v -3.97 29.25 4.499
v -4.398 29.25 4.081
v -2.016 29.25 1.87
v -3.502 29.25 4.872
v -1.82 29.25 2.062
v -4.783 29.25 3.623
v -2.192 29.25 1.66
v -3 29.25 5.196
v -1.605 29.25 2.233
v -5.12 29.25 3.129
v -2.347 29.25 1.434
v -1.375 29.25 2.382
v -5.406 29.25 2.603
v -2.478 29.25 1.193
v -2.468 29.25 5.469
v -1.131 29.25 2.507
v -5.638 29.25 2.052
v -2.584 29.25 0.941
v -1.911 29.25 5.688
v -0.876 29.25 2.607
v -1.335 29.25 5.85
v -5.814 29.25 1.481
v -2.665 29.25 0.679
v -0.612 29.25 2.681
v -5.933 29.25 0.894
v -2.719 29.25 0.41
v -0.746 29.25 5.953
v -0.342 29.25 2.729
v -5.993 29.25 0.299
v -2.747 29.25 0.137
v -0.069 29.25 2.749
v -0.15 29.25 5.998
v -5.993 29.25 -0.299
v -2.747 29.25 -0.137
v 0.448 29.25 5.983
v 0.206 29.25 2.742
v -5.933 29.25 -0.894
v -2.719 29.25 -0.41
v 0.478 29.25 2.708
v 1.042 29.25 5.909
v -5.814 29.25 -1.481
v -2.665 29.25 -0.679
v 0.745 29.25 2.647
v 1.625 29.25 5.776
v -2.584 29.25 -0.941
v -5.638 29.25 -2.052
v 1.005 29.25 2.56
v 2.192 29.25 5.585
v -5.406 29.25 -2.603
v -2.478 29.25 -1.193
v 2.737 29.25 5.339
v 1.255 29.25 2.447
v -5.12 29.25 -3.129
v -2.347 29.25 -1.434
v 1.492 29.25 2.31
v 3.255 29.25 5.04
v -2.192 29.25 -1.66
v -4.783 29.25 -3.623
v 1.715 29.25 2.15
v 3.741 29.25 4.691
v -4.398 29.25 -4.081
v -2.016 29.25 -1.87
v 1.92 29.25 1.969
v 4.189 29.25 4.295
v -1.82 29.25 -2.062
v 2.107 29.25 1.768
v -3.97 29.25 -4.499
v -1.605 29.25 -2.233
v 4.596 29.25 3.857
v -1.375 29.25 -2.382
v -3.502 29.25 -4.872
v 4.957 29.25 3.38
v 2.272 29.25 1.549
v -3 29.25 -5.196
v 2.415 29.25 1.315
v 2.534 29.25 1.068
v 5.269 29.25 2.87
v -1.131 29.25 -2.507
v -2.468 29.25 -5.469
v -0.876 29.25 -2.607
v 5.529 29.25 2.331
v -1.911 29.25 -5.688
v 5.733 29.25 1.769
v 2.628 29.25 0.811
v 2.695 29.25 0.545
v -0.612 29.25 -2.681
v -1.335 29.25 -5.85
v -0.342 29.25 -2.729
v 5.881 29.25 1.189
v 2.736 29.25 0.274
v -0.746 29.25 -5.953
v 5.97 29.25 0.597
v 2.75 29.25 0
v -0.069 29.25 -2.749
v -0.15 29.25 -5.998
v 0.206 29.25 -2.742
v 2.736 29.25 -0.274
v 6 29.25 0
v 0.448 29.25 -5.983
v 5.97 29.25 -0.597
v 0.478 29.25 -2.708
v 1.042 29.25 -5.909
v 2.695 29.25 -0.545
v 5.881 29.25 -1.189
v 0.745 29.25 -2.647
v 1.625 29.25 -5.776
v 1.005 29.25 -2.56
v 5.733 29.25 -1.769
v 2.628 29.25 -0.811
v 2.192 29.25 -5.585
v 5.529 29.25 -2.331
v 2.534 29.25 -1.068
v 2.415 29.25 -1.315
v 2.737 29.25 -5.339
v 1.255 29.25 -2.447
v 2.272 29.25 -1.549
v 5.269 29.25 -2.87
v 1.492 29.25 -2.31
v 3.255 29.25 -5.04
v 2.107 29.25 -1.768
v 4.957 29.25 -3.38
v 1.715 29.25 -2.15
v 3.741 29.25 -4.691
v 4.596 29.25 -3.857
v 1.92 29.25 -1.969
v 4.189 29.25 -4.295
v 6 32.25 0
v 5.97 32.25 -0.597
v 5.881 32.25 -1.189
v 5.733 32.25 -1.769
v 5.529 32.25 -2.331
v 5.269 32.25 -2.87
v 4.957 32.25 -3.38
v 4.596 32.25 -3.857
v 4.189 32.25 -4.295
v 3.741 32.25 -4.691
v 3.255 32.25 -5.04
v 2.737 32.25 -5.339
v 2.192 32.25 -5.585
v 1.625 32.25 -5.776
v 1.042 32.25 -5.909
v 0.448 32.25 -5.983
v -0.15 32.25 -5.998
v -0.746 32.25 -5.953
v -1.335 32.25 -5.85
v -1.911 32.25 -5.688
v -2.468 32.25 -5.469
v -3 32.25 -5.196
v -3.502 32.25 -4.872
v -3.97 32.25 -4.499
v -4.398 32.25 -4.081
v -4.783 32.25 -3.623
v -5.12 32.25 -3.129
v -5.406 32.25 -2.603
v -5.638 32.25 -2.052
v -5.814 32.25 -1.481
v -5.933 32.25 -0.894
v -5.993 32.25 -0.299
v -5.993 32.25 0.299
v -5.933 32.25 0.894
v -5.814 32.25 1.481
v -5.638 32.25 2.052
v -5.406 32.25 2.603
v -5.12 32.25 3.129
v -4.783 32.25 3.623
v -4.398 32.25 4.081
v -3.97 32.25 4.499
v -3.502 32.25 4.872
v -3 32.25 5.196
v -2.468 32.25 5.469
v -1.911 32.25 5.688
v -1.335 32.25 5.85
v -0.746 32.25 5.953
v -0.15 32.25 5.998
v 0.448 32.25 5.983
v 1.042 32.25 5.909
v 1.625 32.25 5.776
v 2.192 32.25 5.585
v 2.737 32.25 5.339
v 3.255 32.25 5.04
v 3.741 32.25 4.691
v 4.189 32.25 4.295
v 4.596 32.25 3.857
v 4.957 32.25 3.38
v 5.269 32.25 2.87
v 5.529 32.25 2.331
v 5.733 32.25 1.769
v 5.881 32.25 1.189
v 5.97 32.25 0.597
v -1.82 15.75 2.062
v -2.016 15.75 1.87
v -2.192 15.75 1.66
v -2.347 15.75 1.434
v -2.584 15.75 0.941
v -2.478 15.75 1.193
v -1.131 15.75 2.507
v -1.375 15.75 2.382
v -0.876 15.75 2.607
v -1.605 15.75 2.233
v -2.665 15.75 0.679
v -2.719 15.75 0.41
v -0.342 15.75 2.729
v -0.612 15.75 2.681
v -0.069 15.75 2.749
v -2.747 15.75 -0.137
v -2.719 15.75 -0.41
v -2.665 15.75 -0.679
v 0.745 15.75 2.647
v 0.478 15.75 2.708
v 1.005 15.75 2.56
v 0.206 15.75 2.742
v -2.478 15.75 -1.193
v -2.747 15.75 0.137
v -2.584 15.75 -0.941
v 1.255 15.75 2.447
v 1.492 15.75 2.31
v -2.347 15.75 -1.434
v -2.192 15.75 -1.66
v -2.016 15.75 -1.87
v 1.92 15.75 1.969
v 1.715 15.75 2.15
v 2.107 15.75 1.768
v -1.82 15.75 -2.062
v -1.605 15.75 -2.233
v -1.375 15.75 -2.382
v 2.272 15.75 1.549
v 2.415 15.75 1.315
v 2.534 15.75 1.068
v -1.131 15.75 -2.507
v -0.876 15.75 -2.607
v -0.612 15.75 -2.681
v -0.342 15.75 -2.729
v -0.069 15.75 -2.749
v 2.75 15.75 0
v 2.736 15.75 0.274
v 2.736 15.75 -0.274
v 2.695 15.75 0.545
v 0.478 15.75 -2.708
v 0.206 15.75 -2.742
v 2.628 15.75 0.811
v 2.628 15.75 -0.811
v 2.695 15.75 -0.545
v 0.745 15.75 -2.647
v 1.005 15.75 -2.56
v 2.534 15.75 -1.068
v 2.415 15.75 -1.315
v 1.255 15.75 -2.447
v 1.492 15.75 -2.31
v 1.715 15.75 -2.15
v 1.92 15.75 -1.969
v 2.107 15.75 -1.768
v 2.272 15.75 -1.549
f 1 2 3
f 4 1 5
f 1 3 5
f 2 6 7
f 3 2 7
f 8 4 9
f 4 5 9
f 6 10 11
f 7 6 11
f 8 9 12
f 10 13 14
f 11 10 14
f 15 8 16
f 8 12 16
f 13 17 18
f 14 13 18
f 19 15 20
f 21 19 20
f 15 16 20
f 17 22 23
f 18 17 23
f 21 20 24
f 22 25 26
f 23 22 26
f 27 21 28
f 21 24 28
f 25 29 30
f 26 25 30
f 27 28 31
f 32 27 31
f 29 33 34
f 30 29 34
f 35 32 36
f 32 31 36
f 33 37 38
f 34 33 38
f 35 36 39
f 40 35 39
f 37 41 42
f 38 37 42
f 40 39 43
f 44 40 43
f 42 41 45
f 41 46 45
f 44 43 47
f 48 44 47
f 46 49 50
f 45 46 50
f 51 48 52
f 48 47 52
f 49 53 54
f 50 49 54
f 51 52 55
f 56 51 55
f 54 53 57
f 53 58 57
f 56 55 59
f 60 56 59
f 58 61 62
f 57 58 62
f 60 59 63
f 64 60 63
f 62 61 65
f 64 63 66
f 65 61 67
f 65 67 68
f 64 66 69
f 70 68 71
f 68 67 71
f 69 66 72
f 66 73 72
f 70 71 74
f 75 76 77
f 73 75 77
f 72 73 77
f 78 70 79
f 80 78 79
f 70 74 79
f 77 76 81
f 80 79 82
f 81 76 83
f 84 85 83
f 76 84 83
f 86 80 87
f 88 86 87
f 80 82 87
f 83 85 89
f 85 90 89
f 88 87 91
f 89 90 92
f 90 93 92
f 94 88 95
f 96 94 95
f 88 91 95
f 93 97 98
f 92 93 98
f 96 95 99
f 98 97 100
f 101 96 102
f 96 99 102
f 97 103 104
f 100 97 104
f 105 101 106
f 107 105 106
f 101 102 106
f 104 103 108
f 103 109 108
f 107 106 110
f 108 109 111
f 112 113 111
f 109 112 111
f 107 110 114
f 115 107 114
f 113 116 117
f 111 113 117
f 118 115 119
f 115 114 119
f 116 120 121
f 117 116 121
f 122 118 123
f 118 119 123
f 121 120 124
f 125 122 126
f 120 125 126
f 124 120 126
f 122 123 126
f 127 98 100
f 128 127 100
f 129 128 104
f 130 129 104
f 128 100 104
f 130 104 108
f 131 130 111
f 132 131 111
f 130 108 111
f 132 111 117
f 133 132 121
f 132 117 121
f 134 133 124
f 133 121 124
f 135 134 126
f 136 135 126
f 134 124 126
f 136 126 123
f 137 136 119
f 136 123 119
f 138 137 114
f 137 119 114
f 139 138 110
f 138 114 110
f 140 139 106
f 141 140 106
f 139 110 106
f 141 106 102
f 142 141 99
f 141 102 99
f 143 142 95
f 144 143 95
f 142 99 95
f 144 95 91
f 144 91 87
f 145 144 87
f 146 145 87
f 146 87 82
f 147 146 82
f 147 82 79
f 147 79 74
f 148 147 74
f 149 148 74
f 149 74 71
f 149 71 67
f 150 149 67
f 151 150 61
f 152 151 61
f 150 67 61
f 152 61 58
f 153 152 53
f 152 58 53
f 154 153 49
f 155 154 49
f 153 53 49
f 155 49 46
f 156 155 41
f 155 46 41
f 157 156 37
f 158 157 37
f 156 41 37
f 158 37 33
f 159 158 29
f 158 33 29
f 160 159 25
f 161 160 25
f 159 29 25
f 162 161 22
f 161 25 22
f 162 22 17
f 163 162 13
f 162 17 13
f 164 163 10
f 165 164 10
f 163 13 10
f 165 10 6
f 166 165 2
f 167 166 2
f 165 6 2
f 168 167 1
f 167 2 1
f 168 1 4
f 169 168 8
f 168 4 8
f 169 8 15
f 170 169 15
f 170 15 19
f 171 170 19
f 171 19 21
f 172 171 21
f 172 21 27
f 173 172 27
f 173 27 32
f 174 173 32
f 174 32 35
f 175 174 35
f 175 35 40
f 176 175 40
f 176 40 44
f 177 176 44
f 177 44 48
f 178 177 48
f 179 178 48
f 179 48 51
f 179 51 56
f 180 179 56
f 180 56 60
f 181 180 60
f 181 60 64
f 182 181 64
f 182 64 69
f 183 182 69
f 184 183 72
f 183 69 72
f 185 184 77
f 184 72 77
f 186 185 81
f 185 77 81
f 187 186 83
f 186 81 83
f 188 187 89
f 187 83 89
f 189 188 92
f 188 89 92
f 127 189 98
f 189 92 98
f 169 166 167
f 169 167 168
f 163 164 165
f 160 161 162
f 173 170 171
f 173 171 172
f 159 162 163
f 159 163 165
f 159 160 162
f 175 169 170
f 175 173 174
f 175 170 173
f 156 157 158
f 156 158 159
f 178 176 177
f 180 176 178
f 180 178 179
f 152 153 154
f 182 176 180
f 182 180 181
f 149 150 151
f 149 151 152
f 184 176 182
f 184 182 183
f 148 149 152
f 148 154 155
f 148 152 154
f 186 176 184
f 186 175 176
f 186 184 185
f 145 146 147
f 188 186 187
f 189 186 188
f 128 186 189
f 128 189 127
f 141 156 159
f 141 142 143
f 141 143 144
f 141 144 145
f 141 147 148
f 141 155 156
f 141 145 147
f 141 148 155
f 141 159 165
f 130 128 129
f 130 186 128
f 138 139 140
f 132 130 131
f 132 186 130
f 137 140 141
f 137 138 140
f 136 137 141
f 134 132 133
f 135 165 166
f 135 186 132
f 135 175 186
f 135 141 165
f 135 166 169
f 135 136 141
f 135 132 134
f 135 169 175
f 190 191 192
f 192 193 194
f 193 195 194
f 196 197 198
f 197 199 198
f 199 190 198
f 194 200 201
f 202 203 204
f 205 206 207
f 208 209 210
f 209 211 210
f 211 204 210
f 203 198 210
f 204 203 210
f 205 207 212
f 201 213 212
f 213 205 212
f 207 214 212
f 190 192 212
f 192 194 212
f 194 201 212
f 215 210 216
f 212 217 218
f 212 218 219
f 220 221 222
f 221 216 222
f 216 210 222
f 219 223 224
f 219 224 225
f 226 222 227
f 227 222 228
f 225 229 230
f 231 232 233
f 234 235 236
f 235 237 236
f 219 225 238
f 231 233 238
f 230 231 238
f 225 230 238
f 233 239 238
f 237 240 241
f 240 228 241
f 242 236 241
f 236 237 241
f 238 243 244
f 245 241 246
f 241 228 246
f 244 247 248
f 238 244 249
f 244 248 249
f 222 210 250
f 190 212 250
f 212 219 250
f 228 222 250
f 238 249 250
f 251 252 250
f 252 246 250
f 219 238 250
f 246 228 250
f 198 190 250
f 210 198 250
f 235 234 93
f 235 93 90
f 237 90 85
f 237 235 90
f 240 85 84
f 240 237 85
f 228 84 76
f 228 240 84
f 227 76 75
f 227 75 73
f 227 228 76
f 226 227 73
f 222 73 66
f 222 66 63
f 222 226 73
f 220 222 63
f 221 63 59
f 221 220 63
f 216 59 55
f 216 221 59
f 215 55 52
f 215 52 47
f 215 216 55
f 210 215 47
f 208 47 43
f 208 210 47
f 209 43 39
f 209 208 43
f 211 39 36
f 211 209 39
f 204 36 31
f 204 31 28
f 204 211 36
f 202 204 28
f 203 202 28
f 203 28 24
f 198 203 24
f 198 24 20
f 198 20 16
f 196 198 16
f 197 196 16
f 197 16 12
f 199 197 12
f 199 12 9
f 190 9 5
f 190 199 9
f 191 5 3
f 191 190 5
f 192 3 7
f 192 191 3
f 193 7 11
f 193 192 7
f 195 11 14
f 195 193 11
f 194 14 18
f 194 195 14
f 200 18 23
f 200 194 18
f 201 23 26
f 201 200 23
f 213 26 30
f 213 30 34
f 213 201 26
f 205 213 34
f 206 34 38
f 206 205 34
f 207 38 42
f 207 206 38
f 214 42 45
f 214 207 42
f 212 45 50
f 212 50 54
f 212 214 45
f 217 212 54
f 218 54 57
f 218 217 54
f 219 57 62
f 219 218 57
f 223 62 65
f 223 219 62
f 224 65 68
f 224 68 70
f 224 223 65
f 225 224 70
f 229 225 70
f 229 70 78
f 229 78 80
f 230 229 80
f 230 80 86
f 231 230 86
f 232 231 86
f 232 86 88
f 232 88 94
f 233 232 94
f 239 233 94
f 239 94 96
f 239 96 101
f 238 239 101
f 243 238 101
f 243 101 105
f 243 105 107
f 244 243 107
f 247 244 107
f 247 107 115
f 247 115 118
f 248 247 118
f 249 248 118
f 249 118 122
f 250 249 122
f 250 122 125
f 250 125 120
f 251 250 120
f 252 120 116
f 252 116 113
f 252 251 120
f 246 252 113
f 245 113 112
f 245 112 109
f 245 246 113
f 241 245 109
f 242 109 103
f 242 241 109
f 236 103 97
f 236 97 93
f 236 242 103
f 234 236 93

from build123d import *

# Parameters (mm, degrees)
SKETCH1_R           = 10
BOSS_EXTRUDE1_DEPTH = 45
SCALE_1_SCALE       = 0.3
SKETCH_1_R          = 6
EXTRUDE_1_DEPTH     = 3
SKETCH_2_R          = 3
SKETCH_2_R_2        = 2.75
CUT_EXTRUDE_1_DEPTH = 13.5


with BuildPart() as part:
    # Sketch1 → Boss-Extrude1 (new body)
    with BuildSketch(Plane(origin=(0, 0, 0), x_dir=(1, 0, 0), z_dir=(0, 1, 0))):
        Circle(SKETCH1_R)
    extrude(amount=BOSS_EXTRUDE1_DEPTH)


with BuildPart() as part_1:
    # 축척1: scaled about (0, 22.5, 0)
    add(part.part.scale(SCALE_1_SCALE).moved(Location((0, 15.75, 0))))

    # 스케치1 → 보스-돌출1 (add)
    with BuildSketch(Plane(origin=(0, 29.25, 0), x_dir=(1, 0, 0), z_dir=(0, 1, 0))):
        Circle(SKETCH_1_R)
    extrude(amount=EXTRUDE_1_DEPTH)

    # 스케치2 → 컷-돌출1 (cut)
    with BuildSketch(Plane.XZ.offset(-15.75)):
        Circle(SKETCH_2_R)
        Circle(SKETCH_2_R_2, mode=Mode.SUBTRACT)
    extrude(amount=-CUT_EXTRUDE_1_DEPTH, mode=Mode.SUBTRACT)


solid = part_1.part
